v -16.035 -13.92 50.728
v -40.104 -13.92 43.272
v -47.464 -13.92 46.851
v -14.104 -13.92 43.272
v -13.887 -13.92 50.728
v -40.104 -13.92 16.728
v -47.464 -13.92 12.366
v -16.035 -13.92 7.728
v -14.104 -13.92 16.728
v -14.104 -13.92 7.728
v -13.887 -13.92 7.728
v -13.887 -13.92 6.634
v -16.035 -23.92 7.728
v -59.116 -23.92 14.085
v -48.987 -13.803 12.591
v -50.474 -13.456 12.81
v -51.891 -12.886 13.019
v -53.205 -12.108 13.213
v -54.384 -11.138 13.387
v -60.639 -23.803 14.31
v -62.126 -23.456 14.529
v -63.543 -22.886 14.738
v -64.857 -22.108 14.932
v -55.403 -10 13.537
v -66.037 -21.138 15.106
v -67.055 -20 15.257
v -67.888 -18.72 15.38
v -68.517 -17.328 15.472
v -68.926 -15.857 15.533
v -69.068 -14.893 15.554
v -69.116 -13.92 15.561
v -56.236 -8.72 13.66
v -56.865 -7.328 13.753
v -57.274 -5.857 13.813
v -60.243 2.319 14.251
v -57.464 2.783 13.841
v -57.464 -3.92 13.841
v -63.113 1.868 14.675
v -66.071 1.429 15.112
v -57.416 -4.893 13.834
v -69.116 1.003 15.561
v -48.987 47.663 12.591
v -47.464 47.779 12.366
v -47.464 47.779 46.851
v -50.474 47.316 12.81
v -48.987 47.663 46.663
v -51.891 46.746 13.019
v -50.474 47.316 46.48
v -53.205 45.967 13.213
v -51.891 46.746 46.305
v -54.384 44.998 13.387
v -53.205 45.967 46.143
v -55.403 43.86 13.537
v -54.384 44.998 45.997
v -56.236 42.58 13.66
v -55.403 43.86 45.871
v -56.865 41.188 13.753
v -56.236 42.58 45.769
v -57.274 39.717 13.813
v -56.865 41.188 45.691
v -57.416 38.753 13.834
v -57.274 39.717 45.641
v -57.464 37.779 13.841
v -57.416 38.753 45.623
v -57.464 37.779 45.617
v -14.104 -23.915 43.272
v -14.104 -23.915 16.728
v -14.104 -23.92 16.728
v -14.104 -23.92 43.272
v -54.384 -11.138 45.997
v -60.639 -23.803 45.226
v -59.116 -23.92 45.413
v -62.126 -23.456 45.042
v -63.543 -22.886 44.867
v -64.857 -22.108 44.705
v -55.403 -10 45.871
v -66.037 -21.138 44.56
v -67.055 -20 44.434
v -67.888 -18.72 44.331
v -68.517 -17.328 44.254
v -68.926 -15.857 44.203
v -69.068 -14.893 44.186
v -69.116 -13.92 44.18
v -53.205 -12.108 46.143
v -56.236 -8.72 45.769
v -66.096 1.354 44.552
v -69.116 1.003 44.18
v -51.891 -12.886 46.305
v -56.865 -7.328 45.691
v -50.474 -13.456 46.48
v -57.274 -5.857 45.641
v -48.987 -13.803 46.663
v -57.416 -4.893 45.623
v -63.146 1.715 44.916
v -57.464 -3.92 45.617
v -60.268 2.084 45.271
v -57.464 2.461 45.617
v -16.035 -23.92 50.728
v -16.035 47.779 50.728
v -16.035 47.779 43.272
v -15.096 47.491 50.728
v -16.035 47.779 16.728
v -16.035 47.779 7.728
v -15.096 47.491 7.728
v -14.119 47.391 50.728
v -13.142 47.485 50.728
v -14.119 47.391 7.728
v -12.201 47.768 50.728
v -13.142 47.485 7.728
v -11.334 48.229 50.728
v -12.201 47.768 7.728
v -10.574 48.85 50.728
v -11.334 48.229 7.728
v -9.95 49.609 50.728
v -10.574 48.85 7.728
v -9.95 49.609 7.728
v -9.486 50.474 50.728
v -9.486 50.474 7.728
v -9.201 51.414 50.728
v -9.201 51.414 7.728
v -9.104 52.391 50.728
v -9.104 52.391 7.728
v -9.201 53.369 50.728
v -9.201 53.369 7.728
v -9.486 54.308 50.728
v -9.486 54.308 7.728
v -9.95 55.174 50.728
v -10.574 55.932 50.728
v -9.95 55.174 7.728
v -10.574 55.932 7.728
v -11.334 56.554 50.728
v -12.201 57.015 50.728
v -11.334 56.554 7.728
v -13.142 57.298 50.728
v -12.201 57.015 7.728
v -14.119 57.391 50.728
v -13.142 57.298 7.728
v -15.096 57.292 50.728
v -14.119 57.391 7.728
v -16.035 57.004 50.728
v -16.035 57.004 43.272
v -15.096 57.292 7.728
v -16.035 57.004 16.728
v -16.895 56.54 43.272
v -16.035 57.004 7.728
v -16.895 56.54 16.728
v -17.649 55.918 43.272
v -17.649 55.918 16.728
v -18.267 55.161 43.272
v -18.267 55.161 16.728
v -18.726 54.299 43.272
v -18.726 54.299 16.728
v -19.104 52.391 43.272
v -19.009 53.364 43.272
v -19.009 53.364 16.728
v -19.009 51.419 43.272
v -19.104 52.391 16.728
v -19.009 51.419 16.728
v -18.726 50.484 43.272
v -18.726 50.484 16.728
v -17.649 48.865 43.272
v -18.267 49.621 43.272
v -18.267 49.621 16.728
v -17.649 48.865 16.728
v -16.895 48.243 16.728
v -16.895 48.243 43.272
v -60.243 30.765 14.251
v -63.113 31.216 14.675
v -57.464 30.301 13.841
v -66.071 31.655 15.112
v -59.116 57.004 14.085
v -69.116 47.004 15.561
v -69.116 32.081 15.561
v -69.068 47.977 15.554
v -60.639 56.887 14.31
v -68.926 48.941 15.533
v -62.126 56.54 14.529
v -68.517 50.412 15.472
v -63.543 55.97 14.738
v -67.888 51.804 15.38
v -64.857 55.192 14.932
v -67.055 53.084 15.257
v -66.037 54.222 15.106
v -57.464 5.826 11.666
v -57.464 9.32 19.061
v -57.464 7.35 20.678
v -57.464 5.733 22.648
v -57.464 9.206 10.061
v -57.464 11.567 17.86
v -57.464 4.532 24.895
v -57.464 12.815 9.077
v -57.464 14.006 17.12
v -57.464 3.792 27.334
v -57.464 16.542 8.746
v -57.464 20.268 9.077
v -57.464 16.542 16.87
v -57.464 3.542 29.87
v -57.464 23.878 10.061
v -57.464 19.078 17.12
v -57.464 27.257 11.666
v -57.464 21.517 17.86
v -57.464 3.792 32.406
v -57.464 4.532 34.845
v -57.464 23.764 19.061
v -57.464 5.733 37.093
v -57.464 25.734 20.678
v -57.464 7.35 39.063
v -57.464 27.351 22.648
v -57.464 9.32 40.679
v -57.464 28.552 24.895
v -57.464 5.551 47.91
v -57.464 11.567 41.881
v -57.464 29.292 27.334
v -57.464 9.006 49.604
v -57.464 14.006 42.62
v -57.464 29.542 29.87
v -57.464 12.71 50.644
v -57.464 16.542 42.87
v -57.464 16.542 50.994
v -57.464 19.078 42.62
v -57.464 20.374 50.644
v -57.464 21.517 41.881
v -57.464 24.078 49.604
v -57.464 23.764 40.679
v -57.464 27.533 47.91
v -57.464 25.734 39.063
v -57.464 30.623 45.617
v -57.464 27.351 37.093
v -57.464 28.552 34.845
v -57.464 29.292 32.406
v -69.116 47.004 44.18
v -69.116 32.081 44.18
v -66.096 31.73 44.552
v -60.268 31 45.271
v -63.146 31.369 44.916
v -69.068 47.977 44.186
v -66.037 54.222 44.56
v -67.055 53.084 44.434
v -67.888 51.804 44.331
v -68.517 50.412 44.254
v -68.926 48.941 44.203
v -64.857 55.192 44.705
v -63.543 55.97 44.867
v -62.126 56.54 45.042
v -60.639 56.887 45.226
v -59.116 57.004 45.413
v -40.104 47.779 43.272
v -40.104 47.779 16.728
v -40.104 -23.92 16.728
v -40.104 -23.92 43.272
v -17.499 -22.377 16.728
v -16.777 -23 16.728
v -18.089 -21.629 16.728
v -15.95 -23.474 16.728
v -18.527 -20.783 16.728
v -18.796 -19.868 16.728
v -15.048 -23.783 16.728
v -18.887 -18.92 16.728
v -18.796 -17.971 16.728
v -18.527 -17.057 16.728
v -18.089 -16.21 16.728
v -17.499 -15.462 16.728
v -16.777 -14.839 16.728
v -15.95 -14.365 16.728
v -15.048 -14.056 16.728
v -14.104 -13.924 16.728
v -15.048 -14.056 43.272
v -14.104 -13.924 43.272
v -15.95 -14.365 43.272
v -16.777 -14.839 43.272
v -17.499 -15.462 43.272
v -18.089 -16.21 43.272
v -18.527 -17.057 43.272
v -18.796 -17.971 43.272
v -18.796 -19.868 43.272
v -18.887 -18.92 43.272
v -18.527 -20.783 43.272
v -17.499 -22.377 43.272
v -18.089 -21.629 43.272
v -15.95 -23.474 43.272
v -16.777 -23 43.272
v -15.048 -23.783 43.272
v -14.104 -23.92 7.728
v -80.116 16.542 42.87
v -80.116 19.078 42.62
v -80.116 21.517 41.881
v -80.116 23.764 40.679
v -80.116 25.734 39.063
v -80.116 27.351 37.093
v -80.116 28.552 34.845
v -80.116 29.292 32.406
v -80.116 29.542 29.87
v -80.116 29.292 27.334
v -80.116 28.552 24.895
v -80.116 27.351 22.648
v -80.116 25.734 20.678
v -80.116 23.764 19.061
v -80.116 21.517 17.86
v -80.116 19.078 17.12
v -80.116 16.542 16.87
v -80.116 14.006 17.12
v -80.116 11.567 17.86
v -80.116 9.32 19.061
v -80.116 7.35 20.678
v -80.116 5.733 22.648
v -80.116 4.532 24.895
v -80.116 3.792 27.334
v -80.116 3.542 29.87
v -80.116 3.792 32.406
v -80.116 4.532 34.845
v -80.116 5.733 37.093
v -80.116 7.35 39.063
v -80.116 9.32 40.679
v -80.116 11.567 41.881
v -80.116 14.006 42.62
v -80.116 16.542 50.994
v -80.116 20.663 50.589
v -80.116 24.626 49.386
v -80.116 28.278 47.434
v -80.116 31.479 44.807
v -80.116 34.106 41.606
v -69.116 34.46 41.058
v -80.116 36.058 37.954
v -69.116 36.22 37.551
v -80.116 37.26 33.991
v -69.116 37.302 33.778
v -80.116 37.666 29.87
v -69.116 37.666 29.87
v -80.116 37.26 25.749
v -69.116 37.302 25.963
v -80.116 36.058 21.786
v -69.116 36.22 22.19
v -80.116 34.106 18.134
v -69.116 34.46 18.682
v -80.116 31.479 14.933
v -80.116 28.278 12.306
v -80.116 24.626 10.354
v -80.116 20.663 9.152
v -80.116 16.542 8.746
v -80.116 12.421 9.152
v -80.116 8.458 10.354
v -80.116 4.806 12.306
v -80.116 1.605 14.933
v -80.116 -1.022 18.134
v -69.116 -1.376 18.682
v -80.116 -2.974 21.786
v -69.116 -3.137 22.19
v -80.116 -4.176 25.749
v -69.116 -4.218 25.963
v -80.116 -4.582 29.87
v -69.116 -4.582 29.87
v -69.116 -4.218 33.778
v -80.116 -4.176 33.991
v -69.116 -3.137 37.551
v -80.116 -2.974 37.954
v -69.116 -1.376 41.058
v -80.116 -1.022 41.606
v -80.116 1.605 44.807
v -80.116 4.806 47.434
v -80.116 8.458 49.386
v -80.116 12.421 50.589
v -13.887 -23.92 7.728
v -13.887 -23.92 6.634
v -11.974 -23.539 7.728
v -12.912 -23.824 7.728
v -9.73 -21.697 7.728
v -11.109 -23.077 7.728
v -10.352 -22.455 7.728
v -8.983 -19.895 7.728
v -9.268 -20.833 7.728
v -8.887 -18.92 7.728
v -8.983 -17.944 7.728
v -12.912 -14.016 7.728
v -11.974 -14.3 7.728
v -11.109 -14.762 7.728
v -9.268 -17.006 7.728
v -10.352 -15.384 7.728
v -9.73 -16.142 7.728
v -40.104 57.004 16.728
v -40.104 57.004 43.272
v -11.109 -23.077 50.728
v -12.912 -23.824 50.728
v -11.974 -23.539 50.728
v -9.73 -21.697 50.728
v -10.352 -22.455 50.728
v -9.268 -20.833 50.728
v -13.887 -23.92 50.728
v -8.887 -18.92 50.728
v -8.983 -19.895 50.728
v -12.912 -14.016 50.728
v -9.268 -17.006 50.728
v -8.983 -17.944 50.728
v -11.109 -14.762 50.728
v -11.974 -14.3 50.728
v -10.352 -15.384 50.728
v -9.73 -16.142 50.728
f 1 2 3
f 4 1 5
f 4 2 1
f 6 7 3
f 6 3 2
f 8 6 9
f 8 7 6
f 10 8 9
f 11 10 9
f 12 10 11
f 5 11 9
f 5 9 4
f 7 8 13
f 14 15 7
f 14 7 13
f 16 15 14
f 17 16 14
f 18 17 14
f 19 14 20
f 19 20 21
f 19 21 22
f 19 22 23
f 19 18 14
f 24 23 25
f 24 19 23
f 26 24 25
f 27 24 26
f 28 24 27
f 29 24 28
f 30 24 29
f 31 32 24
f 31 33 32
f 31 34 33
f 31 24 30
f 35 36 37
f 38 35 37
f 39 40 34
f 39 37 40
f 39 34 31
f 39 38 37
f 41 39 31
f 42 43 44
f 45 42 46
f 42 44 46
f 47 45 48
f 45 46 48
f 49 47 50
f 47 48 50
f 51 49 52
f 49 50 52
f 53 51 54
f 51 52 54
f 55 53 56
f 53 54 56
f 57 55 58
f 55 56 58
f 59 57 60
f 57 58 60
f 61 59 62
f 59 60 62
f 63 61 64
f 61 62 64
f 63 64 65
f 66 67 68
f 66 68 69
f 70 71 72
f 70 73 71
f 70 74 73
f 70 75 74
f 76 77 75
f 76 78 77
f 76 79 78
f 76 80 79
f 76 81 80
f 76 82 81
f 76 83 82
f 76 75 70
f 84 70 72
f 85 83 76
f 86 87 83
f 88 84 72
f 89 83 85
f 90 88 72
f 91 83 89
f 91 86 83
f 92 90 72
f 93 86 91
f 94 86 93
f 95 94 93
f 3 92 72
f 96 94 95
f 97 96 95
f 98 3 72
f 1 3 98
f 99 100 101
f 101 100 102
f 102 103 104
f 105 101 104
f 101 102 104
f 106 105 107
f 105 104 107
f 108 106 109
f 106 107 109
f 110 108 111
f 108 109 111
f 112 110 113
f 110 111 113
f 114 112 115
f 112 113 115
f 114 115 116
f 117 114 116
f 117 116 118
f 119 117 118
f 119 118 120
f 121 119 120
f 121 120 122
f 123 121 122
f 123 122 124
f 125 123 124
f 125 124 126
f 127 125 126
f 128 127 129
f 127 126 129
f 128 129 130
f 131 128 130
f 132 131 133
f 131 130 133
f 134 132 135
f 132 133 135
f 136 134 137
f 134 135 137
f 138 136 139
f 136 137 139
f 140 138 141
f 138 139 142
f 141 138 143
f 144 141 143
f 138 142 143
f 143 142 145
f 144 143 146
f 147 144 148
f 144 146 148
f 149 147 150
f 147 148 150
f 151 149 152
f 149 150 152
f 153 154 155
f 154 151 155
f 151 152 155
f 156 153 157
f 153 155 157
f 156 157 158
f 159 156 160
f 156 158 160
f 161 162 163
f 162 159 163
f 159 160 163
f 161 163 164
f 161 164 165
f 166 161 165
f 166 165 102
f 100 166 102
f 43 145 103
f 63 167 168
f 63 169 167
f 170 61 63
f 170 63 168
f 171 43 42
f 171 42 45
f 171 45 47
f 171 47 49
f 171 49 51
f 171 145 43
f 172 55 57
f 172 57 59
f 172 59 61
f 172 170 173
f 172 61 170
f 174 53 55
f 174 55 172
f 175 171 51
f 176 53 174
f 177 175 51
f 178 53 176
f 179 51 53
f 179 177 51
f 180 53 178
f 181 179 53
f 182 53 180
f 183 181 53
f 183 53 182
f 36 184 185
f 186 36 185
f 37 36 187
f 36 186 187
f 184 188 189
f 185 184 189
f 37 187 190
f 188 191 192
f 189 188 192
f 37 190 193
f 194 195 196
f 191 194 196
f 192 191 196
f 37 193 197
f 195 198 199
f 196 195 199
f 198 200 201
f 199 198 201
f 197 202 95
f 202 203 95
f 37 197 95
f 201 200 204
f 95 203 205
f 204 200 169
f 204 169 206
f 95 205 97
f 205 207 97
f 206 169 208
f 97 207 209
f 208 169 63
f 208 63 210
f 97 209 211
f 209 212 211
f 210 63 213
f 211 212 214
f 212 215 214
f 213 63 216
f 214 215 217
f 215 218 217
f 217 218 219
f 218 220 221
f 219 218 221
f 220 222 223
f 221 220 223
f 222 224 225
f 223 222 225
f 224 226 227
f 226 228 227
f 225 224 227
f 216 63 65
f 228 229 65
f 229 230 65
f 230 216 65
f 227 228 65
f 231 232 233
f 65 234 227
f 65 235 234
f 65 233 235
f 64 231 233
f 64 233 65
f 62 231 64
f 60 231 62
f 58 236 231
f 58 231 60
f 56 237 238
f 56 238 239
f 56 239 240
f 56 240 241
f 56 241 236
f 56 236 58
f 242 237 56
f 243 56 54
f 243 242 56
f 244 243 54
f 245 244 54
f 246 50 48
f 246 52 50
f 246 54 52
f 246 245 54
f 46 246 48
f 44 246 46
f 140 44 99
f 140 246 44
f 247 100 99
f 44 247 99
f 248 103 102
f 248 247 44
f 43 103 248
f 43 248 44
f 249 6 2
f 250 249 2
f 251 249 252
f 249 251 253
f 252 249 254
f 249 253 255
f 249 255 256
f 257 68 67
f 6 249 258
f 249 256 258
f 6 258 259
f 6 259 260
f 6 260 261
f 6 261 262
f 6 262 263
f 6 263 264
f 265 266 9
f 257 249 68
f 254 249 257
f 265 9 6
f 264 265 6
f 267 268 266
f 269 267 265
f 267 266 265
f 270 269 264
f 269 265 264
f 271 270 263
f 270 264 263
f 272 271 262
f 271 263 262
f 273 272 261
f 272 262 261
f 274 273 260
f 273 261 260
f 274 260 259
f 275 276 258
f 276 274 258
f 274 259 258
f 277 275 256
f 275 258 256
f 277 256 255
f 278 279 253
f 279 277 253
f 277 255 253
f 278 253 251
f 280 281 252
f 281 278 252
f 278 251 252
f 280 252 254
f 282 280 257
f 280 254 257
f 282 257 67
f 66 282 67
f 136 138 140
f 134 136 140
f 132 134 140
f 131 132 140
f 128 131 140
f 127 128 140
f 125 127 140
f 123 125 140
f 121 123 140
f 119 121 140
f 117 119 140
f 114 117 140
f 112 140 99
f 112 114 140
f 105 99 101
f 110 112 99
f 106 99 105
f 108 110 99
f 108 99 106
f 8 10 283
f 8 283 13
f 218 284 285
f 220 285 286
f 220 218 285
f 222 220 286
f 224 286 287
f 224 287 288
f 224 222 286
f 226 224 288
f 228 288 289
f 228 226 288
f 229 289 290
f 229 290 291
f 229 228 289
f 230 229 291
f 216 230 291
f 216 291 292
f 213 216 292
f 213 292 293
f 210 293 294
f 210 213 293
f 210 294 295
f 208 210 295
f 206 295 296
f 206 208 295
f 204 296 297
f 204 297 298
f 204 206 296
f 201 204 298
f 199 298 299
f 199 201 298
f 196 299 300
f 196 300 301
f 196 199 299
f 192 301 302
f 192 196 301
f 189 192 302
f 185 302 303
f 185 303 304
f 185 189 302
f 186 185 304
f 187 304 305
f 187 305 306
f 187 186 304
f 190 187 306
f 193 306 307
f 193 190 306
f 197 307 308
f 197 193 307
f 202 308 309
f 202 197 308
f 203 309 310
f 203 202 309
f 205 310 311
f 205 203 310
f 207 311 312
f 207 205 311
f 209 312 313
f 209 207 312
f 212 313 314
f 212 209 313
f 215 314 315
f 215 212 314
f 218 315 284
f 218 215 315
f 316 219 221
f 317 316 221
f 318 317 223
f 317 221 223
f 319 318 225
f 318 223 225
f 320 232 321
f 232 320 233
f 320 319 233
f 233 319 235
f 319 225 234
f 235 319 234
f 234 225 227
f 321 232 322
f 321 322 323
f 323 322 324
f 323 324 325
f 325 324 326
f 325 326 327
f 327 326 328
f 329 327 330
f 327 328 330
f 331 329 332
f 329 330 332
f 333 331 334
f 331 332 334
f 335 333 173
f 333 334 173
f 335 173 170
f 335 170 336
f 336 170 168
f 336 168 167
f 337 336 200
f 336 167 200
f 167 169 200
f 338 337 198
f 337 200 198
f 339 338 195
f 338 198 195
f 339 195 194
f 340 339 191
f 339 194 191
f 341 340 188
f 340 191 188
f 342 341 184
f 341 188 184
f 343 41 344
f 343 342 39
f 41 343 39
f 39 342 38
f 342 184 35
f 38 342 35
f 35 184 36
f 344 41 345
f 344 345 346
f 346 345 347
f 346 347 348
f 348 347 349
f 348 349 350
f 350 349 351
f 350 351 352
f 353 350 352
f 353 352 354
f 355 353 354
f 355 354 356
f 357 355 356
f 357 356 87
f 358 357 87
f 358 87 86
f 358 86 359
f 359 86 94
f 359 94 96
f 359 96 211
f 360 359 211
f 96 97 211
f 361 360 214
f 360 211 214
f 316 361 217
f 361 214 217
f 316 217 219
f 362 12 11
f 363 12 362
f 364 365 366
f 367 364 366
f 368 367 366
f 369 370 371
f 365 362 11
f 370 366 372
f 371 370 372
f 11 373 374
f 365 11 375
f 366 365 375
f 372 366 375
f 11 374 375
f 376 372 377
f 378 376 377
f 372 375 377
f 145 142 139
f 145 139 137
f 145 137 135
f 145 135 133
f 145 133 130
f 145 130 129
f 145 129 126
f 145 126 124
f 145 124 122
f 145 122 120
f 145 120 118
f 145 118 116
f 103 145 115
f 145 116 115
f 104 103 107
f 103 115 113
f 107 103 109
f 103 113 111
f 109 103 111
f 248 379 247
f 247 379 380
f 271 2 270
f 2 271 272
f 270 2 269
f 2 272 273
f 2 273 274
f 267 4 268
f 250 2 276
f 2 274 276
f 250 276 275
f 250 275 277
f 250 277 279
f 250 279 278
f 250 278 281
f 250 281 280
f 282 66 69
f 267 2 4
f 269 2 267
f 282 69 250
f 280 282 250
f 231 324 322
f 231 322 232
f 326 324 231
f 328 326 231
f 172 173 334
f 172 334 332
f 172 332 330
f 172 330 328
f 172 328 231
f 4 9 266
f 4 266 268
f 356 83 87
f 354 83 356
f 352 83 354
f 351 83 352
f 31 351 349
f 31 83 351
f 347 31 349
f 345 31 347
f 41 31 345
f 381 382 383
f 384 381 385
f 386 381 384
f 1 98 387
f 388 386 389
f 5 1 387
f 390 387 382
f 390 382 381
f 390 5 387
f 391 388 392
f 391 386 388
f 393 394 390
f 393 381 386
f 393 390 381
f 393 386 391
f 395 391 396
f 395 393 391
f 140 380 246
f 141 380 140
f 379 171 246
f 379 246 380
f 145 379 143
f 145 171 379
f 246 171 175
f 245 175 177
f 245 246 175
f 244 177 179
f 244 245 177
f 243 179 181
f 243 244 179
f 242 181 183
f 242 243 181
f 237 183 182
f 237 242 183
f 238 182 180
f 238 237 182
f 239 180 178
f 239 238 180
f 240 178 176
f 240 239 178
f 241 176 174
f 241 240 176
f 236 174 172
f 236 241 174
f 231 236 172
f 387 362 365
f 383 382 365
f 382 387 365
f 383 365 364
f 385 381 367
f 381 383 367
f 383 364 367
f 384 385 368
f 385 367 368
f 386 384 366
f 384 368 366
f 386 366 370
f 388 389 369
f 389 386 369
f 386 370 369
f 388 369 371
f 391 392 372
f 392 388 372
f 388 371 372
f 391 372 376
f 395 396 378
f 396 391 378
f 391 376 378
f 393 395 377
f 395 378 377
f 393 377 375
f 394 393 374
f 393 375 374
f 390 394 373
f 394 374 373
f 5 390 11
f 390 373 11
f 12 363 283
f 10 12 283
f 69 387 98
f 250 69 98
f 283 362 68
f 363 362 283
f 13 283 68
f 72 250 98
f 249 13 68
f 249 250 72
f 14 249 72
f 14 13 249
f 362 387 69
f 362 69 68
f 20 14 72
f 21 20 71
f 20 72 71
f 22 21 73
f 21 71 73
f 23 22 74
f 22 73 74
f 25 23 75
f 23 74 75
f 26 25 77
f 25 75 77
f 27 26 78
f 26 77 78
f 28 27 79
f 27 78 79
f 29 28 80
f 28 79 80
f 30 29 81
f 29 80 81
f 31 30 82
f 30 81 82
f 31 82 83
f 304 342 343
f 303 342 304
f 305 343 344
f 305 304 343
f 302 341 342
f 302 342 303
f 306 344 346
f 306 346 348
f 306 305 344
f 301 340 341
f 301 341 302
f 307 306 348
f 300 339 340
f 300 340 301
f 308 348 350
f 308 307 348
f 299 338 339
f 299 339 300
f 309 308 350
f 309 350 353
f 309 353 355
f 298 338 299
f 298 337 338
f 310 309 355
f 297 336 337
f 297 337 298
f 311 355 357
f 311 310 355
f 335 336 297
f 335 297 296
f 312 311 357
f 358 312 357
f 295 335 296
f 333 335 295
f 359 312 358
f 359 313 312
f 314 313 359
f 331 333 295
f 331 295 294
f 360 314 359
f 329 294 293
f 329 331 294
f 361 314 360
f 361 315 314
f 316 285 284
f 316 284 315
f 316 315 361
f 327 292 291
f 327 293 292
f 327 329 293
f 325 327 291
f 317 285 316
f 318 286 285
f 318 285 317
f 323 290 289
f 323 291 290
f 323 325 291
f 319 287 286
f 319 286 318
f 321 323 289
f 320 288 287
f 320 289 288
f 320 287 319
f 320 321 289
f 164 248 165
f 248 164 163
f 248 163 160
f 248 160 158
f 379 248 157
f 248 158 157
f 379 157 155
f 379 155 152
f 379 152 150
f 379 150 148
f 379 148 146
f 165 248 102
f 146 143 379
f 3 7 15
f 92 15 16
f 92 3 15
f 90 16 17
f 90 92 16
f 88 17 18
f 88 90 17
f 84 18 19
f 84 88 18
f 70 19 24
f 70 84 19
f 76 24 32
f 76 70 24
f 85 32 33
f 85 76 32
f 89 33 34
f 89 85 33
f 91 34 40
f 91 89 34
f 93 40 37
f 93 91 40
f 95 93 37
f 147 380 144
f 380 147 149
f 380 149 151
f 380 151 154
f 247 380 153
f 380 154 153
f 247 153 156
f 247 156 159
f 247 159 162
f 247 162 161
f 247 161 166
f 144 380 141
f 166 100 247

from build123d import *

# Parameters (mm, degrees)
BOSS_EXTRUDE1_DEPTH      = 60
CUT_EXTRUDE1_DEPTH       = 26
BOSS_EXTRUDE2_DEPTH      = 34
BOSS_EXTRUDE2_DEPTH_BACK = 9
SKETCH4_R                = 5
CUT_EXTRUDE2_DEPTH       = 117
CUT_EXTRUDE3_DEPTH       = 31
BOSS_EXTRUDE3_START      = -11.652052
SKETCH7_R                = 21.124192
SKETCH7_R_2              = 13
BOSS_EXTRUDE3_DEPTH      = 22.652052
FILLET1_R                = 10


with BuildPart() as part:
    # Sketch2 → Boss-Extrude1 (new body)
    with BuildSketch(Plane.XY):
        Polygon((-14.104352, 47.779255), (-57.46381, 47.779255), (-57.46381, -13.919632), (-13.887058, -13.919632), (-13.887058, -23.919632), (-69.115862, -23.919632), (-69.115862, 57.003505), (-14.104352, 57.003505), align=None)
    extrude(amount=BOSS_EXTRUDE1_DEPTH)

    # Sketch3 → Cut-Extrude1 (cut)
    with BuildSketch(Plane(origin=(-14.104352, 0, 0), x_dir=(0, 0, -1), z_dir=(1, 0, 0))):
        Polygon((-43.271654, -23.143882), (-43.271654, 57.003505), (-16.728346, 57.003505), (-16.728346, -23.143882), (-16.728346, -35.223541), (-43.271654, -35.223541), align=None)
    extrude(amount=-CUT_EXTRUDE1_DEPTH, mode=Mode.SUBTRACT)

    # Sketch4 → Boss-Extrude2 (add, two sides: drawn at the far end of the back side and taken through both)
    with BuildSketch(Plane.XY.offset(16.728346).offset(-BOSS_EXTRUDE2_DEPTH_BACK)):
        with Locations(Location((-14.104352, 52.39138, 0), (0, 0, 247.283219))):
            Circle(SKETCH4_R)
        with Locations((-13.887058, -18.919632)):
            Circle(SKETCH4_R)
    extrude(amount=BOSS_EXTRUDE2_DEPTH + BOSS_EXTRUDE2_DEPTH_BACK)

    # Sketch5 → Cut-Extrude2 (cut)
    with BuildSketch(Plane(origin=(0, 57.003505, 0), x_dir=(1, 0, 0), z_dir=(0, 1, 0))):
        Polygon((-14.104352, -7.728346), (-16.035233, -7.728346), (-69.115862, -15.56073), (-69.115862, 0), (-12.569793, 0), align=None)
        Polygon((-69.115862, -44.179694), (-16.035233, -50.728346), (-13.887058, -50.728346), (-13.887058, -60), (-69.115862, -60), align=None)
    extrude(amount=-CUT_EXTRUDE2_DEPTH, mode=Mode.SUBTRACT)

    # Sketch6 → Cut-Extrude3 (cut)
    with BuildSketch(Plane.ZY.offset(69.115862)):
        with BuildLine():
            ThreePointArc((42.870212, 16.541936), (29.870212, 29.541936), (16.870212, 16.541936))
            Line((16.870212, 16.541936), (42.870212, 16.541936))
        make_face()
        with BuildLine():
            Line((42.870212, 16.541936), (16.870212, 16.541936))
            ThreePointArc((16.870212, 16.541936), (29.870212, 3.541936), (42.870212, 16.541936))
        make_face()
    extrude(amount=-CUT_EXTRUDE3_DEPTH, mode=Mode.SUBTRACT)

    # Sketch7 → Boss-Extrude3 (add)
    with BuildSketch(Plane.ZY.offset(69.115862).offset(BOSS_EXTRUDE3_START)):
        with Locations((29.870212, 16.541936)):
            Circle(SKETCH7_R)
        with Locations((29.870212, 16.541936)):
            Circle(SKETCH7_R_2, mode=Mode.SUBTRACT)
    extrude(amount=BOSS_EXTRUDE3_DEPTH)

    # Fillet1
    fillet1_edges = [part.edges().sort_by_distance(p)[0] for p in [
        (-57.46381, -13.919632, 29.729312),
        (-57.46381, 47.779255, 29.729312),
        (-69.115862, 57.003505, 29.870212),
        (-69.115862, -23.919632, 29.870212),
    ]]
    fillet(fillet1_edges, radius=FILLET1_R)


solid = part.part
